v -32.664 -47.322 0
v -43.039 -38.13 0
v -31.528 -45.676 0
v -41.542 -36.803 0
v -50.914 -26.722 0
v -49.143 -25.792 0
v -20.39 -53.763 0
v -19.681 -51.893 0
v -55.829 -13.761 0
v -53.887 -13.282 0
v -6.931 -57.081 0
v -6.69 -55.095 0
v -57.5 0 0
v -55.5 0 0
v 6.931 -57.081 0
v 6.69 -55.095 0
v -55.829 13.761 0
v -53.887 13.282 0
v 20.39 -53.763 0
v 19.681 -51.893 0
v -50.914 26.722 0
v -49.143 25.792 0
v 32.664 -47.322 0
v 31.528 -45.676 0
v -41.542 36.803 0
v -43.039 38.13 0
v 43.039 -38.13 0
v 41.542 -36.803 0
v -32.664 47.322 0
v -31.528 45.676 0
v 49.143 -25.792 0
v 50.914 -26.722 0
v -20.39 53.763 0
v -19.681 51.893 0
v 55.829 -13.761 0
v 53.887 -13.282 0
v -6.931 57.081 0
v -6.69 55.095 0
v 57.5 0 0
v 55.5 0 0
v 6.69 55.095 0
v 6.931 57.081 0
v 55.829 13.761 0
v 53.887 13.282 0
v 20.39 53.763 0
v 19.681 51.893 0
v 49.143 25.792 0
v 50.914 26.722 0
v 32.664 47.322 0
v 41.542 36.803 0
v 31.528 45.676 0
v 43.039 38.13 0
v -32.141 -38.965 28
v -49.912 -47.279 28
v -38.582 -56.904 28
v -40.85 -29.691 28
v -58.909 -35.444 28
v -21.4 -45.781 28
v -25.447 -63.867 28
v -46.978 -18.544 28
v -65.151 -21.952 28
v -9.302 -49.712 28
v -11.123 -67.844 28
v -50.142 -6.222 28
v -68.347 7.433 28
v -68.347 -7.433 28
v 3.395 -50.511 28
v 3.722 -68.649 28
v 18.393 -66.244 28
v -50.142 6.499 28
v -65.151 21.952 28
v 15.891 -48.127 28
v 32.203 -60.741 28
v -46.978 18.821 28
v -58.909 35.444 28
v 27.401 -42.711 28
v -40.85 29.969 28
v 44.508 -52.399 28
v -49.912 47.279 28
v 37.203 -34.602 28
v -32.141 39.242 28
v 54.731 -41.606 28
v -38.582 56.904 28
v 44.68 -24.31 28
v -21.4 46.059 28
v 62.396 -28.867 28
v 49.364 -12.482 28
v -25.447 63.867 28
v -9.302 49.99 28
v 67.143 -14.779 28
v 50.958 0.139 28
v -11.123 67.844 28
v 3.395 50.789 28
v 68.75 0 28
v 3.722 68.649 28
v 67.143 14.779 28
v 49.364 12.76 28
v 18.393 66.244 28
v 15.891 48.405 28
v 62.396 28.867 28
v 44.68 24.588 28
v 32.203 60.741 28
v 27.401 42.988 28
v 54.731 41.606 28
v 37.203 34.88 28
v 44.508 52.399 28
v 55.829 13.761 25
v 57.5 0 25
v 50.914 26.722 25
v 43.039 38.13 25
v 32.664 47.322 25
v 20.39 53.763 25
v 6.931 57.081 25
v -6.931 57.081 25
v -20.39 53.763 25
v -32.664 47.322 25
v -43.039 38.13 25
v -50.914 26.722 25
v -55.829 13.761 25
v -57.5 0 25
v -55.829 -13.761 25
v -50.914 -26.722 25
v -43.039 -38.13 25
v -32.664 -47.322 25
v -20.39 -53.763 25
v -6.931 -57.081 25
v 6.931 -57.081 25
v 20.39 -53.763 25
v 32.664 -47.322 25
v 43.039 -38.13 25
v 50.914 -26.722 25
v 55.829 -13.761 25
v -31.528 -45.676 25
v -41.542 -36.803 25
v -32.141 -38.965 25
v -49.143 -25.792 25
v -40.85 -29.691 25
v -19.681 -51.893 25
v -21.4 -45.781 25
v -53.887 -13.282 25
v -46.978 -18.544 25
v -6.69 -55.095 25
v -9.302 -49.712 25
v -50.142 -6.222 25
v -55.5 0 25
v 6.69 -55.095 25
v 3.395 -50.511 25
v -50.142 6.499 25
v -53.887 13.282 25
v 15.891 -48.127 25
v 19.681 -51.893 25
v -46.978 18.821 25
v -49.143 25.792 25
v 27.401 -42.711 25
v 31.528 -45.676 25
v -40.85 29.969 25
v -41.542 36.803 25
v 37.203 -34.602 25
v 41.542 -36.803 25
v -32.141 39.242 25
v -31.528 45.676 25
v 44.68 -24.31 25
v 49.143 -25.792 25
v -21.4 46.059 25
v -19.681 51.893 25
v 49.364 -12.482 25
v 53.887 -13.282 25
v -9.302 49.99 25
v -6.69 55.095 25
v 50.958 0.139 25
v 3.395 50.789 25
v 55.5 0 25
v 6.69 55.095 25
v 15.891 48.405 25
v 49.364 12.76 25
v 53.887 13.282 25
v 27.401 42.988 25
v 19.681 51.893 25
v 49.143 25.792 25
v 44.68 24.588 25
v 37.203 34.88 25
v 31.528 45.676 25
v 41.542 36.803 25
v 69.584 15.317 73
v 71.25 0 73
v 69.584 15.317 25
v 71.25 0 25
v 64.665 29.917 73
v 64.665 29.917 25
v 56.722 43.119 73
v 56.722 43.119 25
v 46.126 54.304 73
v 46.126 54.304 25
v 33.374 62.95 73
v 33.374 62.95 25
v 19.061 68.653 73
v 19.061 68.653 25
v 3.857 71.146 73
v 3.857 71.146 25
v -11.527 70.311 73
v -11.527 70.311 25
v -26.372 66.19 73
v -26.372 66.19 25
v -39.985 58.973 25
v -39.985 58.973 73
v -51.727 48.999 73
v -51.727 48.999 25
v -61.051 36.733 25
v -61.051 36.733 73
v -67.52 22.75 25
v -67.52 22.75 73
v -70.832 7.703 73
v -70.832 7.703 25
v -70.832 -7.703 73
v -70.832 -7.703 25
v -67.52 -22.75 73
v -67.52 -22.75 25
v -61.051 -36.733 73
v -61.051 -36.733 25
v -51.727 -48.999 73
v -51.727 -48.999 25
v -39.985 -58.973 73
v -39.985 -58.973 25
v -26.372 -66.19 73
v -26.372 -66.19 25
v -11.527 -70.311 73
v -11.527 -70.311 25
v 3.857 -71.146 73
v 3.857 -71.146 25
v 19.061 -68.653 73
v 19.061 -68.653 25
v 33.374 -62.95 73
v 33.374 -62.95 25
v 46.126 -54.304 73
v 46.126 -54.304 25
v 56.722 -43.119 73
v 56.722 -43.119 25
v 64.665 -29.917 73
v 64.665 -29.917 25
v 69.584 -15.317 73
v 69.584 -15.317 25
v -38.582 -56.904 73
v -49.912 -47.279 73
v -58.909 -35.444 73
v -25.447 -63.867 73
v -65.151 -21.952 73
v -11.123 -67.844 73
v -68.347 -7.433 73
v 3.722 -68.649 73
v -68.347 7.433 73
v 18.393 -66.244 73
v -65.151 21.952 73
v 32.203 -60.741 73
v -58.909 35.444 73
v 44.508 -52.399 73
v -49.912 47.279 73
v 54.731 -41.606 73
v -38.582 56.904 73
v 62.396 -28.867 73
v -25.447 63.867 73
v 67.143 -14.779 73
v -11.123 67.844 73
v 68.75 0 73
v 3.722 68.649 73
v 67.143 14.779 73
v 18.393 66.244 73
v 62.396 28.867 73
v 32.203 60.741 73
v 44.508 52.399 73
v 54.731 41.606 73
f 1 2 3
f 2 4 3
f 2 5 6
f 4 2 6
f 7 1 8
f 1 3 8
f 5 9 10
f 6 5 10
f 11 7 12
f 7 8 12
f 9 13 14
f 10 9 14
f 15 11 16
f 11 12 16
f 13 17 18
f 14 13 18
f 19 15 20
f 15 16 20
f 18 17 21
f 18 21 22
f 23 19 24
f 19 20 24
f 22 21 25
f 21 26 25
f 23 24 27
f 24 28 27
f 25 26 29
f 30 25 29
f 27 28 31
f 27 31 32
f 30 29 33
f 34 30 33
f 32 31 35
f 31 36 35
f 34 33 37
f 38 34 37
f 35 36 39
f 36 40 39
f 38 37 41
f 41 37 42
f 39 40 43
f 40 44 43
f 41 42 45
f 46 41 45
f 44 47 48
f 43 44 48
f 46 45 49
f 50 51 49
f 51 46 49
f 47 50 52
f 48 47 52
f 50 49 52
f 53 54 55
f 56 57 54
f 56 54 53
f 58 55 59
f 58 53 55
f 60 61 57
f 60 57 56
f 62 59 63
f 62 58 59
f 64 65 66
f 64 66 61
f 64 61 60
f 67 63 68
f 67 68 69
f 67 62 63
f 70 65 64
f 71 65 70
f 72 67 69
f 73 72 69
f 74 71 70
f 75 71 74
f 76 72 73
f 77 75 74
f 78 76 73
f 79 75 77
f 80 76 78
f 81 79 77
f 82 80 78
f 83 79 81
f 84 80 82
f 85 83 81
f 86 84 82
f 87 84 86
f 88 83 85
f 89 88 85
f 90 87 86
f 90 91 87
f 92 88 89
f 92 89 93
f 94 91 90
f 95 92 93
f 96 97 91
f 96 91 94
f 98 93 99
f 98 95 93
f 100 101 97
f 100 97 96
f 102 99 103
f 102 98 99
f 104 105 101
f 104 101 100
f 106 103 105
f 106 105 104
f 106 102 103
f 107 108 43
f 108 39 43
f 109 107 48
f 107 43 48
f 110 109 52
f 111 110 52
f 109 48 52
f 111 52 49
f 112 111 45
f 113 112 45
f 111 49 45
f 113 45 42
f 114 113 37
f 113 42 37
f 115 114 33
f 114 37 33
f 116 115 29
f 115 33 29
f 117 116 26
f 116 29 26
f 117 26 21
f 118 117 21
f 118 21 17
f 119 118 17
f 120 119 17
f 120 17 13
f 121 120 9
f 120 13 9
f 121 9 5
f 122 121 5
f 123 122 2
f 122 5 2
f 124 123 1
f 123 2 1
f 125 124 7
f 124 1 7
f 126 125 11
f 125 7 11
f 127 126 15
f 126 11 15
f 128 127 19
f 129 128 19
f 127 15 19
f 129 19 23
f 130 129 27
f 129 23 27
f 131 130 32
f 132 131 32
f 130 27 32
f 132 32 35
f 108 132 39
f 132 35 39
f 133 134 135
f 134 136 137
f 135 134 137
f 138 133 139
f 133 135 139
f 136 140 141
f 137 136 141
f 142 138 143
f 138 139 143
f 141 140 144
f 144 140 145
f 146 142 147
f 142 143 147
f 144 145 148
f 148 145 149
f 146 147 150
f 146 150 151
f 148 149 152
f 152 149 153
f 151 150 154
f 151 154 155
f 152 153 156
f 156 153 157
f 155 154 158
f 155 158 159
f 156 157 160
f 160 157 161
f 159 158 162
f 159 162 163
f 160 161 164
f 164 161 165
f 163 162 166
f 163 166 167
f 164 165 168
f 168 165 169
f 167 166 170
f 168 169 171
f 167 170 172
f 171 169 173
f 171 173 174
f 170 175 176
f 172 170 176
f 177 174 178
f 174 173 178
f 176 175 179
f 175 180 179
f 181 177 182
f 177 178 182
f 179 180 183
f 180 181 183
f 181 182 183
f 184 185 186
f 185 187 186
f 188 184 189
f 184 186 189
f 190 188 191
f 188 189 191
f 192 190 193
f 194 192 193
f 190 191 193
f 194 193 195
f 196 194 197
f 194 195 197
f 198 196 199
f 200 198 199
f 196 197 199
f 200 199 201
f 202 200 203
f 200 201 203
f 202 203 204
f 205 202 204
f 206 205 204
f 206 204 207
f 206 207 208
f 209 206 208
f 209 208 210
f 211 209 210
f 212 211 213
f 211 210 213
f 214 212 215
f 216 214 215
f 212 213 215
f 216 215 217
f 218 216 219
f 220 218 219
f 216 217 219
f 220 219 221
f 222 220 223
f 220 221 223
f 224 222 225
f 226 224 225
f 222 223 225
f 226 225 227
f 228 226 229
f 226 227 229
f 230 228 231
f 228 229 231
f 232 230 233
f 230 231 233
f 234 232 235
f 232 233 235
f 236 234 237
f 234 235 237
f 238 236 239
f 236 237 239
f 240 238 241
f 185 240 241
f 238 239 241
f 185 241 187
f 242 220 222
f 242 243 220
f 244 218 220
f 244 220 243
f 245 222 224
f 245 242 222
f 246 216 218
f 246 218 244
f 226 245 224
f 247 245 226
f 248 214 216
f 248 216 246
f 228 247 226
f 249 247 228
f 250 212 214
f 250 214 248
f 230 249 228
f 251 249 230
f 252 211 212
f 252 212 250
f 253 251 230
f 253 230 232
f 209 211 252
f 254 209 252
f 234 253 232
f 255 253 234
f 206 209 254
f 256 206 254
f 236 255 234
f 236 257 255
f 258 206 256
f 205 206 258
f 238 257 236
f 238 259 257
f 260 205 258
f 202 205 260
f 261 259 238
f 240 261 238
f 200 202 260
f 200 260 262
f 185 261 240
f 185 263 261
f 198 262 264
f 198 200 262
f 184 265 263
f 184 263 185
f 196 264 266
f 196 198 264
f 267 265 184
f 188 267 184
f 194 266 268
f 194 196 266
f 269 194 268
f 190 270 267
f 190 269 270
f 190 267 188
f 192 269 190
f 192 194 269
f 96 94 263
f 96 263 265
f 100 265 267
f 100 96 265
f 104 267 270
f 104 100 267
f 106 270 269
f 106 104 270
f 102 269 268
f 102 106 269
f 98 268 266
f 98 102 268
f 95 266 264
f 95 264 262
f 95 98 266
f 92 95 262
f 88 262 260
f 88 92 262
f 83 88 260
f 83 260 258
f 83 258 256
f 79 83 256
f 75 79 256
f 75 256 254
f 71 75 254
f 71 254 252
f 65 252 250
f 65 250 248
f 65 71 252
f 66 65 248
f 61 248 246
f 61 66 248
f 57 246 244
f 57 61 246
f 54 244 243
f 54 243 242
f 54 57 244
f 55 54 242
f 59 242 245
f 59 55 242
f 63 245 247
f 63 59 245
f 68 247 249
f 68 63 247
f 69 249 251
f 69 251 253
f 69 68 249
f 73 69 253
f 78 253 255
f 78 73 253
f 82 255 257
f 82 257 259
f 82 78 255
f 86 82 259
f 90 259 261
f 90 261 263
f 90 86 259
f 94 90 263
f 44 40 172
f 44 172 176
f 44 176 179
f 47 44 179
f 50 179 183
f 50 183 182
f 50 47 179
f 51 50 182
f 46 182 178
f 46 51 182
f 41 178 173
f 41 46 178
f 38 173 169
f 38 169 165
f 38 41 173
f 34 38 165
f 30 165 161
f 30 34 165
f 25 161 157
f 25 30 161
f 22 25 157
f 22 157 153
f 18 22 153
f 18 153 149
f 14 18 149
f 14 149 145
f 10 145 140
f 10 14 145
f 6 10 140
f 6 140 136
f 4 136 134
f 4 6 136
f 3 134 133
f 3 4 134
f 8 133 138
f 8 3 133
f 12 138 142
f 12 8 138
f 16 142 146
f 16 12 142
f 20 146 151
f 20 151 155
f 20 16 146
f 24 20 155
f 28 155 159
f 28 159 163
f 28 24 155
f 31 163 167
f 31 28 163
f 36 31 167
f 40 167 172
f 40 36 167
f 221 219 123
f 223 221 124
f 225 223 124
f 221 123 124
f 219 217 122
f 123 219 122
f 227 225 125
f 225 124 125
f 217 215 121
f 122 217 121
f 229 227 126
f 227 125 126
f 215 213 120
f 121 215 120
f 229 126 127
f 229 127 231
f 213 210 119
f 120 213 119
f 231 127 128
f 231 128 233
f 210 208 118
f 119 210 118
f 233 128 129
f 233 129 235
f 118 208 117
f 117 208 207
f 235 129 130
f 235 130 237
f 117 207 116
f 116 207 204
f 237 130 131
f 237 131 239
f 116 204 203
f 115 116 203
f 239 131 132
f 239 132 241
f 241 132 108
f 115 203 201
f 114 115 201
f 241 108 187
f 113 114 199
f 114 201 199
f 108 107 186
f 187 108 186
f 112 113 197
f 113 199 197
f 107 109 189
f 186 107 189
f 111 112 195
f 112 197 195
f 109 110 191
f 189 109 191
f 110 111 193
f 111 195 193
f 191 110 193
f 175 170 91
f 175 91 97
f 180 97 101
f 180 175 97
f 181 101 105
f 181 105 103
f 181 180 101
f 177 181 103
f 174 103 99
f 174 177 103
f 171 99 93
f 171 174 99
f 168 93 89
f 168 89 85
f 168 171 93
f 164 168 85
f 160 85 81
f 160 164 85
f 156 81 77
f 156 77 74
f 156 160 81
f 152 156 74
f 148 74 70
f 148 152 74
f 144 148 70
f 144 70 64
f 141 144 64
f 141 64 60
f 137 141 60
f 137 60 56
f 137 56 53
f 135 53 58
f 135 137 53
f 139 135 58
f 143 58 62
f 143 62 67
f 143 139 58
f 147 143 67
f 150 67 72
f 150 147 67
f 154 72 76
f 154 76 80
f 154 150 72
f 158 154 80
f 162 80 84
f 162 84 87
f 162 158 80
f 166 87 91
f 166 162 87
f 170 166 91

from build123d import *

# Parameters (mm, degrees)
F0_R     = 57.5
F0_R_2   = 55.5
F1_DEPTH = 25
F2_R     = 57.5
F2_R_2   = 55.5
F2_R_3   = 50.75
F3_DEPTH = 3
F2_R_4   = 71.25
F4_DEPTH = 3
F5_R     = 71.25
F5_R_2   = 68.75
F6_DEPTH = 45


with BuildPart() as f1:
    # F0 (on Top) → F1 (new body)
    with BuildSketch(Plane.XY):
        Circle(F0_R)
        Circle(F0_R_2, mode=Mode.SUBTRACT)
    extrude(amount=F1_DEPTH)

    # F2 (on face) → F3 (join)
    with BuildSketch(Plane.XY.offset(25)):
        Circle(F2_R)
        Circle(F2_R_2, mode=Mode.SUBTRACT)
        Circle(F2_R_2)
        with Locations((0.2079256644, 0.1388053244)):
            Circle(F2_R_3, mode=Mode.SUBTRACT)
    extrude(amount=F3_DEPTH)

    # F2 (on face) → F4 (join)
    with BuildSketch(Plane.XY.offset(25)):
        Circle(F2_R_4)
        Circle(F2_R, mode=Mode.SUBTRACT)
    extrude(amount=F4_DEPTH)

    # F5 (on face) → F6 (join)
    with BuildSketch(Plane.XY.offset(28)):
        Circle(F5_R)
        Circle(F5_R_2, mode=Mode.SUBTRACT)
    extrude(amount=F6_DEPTH)


solid = f1.part
